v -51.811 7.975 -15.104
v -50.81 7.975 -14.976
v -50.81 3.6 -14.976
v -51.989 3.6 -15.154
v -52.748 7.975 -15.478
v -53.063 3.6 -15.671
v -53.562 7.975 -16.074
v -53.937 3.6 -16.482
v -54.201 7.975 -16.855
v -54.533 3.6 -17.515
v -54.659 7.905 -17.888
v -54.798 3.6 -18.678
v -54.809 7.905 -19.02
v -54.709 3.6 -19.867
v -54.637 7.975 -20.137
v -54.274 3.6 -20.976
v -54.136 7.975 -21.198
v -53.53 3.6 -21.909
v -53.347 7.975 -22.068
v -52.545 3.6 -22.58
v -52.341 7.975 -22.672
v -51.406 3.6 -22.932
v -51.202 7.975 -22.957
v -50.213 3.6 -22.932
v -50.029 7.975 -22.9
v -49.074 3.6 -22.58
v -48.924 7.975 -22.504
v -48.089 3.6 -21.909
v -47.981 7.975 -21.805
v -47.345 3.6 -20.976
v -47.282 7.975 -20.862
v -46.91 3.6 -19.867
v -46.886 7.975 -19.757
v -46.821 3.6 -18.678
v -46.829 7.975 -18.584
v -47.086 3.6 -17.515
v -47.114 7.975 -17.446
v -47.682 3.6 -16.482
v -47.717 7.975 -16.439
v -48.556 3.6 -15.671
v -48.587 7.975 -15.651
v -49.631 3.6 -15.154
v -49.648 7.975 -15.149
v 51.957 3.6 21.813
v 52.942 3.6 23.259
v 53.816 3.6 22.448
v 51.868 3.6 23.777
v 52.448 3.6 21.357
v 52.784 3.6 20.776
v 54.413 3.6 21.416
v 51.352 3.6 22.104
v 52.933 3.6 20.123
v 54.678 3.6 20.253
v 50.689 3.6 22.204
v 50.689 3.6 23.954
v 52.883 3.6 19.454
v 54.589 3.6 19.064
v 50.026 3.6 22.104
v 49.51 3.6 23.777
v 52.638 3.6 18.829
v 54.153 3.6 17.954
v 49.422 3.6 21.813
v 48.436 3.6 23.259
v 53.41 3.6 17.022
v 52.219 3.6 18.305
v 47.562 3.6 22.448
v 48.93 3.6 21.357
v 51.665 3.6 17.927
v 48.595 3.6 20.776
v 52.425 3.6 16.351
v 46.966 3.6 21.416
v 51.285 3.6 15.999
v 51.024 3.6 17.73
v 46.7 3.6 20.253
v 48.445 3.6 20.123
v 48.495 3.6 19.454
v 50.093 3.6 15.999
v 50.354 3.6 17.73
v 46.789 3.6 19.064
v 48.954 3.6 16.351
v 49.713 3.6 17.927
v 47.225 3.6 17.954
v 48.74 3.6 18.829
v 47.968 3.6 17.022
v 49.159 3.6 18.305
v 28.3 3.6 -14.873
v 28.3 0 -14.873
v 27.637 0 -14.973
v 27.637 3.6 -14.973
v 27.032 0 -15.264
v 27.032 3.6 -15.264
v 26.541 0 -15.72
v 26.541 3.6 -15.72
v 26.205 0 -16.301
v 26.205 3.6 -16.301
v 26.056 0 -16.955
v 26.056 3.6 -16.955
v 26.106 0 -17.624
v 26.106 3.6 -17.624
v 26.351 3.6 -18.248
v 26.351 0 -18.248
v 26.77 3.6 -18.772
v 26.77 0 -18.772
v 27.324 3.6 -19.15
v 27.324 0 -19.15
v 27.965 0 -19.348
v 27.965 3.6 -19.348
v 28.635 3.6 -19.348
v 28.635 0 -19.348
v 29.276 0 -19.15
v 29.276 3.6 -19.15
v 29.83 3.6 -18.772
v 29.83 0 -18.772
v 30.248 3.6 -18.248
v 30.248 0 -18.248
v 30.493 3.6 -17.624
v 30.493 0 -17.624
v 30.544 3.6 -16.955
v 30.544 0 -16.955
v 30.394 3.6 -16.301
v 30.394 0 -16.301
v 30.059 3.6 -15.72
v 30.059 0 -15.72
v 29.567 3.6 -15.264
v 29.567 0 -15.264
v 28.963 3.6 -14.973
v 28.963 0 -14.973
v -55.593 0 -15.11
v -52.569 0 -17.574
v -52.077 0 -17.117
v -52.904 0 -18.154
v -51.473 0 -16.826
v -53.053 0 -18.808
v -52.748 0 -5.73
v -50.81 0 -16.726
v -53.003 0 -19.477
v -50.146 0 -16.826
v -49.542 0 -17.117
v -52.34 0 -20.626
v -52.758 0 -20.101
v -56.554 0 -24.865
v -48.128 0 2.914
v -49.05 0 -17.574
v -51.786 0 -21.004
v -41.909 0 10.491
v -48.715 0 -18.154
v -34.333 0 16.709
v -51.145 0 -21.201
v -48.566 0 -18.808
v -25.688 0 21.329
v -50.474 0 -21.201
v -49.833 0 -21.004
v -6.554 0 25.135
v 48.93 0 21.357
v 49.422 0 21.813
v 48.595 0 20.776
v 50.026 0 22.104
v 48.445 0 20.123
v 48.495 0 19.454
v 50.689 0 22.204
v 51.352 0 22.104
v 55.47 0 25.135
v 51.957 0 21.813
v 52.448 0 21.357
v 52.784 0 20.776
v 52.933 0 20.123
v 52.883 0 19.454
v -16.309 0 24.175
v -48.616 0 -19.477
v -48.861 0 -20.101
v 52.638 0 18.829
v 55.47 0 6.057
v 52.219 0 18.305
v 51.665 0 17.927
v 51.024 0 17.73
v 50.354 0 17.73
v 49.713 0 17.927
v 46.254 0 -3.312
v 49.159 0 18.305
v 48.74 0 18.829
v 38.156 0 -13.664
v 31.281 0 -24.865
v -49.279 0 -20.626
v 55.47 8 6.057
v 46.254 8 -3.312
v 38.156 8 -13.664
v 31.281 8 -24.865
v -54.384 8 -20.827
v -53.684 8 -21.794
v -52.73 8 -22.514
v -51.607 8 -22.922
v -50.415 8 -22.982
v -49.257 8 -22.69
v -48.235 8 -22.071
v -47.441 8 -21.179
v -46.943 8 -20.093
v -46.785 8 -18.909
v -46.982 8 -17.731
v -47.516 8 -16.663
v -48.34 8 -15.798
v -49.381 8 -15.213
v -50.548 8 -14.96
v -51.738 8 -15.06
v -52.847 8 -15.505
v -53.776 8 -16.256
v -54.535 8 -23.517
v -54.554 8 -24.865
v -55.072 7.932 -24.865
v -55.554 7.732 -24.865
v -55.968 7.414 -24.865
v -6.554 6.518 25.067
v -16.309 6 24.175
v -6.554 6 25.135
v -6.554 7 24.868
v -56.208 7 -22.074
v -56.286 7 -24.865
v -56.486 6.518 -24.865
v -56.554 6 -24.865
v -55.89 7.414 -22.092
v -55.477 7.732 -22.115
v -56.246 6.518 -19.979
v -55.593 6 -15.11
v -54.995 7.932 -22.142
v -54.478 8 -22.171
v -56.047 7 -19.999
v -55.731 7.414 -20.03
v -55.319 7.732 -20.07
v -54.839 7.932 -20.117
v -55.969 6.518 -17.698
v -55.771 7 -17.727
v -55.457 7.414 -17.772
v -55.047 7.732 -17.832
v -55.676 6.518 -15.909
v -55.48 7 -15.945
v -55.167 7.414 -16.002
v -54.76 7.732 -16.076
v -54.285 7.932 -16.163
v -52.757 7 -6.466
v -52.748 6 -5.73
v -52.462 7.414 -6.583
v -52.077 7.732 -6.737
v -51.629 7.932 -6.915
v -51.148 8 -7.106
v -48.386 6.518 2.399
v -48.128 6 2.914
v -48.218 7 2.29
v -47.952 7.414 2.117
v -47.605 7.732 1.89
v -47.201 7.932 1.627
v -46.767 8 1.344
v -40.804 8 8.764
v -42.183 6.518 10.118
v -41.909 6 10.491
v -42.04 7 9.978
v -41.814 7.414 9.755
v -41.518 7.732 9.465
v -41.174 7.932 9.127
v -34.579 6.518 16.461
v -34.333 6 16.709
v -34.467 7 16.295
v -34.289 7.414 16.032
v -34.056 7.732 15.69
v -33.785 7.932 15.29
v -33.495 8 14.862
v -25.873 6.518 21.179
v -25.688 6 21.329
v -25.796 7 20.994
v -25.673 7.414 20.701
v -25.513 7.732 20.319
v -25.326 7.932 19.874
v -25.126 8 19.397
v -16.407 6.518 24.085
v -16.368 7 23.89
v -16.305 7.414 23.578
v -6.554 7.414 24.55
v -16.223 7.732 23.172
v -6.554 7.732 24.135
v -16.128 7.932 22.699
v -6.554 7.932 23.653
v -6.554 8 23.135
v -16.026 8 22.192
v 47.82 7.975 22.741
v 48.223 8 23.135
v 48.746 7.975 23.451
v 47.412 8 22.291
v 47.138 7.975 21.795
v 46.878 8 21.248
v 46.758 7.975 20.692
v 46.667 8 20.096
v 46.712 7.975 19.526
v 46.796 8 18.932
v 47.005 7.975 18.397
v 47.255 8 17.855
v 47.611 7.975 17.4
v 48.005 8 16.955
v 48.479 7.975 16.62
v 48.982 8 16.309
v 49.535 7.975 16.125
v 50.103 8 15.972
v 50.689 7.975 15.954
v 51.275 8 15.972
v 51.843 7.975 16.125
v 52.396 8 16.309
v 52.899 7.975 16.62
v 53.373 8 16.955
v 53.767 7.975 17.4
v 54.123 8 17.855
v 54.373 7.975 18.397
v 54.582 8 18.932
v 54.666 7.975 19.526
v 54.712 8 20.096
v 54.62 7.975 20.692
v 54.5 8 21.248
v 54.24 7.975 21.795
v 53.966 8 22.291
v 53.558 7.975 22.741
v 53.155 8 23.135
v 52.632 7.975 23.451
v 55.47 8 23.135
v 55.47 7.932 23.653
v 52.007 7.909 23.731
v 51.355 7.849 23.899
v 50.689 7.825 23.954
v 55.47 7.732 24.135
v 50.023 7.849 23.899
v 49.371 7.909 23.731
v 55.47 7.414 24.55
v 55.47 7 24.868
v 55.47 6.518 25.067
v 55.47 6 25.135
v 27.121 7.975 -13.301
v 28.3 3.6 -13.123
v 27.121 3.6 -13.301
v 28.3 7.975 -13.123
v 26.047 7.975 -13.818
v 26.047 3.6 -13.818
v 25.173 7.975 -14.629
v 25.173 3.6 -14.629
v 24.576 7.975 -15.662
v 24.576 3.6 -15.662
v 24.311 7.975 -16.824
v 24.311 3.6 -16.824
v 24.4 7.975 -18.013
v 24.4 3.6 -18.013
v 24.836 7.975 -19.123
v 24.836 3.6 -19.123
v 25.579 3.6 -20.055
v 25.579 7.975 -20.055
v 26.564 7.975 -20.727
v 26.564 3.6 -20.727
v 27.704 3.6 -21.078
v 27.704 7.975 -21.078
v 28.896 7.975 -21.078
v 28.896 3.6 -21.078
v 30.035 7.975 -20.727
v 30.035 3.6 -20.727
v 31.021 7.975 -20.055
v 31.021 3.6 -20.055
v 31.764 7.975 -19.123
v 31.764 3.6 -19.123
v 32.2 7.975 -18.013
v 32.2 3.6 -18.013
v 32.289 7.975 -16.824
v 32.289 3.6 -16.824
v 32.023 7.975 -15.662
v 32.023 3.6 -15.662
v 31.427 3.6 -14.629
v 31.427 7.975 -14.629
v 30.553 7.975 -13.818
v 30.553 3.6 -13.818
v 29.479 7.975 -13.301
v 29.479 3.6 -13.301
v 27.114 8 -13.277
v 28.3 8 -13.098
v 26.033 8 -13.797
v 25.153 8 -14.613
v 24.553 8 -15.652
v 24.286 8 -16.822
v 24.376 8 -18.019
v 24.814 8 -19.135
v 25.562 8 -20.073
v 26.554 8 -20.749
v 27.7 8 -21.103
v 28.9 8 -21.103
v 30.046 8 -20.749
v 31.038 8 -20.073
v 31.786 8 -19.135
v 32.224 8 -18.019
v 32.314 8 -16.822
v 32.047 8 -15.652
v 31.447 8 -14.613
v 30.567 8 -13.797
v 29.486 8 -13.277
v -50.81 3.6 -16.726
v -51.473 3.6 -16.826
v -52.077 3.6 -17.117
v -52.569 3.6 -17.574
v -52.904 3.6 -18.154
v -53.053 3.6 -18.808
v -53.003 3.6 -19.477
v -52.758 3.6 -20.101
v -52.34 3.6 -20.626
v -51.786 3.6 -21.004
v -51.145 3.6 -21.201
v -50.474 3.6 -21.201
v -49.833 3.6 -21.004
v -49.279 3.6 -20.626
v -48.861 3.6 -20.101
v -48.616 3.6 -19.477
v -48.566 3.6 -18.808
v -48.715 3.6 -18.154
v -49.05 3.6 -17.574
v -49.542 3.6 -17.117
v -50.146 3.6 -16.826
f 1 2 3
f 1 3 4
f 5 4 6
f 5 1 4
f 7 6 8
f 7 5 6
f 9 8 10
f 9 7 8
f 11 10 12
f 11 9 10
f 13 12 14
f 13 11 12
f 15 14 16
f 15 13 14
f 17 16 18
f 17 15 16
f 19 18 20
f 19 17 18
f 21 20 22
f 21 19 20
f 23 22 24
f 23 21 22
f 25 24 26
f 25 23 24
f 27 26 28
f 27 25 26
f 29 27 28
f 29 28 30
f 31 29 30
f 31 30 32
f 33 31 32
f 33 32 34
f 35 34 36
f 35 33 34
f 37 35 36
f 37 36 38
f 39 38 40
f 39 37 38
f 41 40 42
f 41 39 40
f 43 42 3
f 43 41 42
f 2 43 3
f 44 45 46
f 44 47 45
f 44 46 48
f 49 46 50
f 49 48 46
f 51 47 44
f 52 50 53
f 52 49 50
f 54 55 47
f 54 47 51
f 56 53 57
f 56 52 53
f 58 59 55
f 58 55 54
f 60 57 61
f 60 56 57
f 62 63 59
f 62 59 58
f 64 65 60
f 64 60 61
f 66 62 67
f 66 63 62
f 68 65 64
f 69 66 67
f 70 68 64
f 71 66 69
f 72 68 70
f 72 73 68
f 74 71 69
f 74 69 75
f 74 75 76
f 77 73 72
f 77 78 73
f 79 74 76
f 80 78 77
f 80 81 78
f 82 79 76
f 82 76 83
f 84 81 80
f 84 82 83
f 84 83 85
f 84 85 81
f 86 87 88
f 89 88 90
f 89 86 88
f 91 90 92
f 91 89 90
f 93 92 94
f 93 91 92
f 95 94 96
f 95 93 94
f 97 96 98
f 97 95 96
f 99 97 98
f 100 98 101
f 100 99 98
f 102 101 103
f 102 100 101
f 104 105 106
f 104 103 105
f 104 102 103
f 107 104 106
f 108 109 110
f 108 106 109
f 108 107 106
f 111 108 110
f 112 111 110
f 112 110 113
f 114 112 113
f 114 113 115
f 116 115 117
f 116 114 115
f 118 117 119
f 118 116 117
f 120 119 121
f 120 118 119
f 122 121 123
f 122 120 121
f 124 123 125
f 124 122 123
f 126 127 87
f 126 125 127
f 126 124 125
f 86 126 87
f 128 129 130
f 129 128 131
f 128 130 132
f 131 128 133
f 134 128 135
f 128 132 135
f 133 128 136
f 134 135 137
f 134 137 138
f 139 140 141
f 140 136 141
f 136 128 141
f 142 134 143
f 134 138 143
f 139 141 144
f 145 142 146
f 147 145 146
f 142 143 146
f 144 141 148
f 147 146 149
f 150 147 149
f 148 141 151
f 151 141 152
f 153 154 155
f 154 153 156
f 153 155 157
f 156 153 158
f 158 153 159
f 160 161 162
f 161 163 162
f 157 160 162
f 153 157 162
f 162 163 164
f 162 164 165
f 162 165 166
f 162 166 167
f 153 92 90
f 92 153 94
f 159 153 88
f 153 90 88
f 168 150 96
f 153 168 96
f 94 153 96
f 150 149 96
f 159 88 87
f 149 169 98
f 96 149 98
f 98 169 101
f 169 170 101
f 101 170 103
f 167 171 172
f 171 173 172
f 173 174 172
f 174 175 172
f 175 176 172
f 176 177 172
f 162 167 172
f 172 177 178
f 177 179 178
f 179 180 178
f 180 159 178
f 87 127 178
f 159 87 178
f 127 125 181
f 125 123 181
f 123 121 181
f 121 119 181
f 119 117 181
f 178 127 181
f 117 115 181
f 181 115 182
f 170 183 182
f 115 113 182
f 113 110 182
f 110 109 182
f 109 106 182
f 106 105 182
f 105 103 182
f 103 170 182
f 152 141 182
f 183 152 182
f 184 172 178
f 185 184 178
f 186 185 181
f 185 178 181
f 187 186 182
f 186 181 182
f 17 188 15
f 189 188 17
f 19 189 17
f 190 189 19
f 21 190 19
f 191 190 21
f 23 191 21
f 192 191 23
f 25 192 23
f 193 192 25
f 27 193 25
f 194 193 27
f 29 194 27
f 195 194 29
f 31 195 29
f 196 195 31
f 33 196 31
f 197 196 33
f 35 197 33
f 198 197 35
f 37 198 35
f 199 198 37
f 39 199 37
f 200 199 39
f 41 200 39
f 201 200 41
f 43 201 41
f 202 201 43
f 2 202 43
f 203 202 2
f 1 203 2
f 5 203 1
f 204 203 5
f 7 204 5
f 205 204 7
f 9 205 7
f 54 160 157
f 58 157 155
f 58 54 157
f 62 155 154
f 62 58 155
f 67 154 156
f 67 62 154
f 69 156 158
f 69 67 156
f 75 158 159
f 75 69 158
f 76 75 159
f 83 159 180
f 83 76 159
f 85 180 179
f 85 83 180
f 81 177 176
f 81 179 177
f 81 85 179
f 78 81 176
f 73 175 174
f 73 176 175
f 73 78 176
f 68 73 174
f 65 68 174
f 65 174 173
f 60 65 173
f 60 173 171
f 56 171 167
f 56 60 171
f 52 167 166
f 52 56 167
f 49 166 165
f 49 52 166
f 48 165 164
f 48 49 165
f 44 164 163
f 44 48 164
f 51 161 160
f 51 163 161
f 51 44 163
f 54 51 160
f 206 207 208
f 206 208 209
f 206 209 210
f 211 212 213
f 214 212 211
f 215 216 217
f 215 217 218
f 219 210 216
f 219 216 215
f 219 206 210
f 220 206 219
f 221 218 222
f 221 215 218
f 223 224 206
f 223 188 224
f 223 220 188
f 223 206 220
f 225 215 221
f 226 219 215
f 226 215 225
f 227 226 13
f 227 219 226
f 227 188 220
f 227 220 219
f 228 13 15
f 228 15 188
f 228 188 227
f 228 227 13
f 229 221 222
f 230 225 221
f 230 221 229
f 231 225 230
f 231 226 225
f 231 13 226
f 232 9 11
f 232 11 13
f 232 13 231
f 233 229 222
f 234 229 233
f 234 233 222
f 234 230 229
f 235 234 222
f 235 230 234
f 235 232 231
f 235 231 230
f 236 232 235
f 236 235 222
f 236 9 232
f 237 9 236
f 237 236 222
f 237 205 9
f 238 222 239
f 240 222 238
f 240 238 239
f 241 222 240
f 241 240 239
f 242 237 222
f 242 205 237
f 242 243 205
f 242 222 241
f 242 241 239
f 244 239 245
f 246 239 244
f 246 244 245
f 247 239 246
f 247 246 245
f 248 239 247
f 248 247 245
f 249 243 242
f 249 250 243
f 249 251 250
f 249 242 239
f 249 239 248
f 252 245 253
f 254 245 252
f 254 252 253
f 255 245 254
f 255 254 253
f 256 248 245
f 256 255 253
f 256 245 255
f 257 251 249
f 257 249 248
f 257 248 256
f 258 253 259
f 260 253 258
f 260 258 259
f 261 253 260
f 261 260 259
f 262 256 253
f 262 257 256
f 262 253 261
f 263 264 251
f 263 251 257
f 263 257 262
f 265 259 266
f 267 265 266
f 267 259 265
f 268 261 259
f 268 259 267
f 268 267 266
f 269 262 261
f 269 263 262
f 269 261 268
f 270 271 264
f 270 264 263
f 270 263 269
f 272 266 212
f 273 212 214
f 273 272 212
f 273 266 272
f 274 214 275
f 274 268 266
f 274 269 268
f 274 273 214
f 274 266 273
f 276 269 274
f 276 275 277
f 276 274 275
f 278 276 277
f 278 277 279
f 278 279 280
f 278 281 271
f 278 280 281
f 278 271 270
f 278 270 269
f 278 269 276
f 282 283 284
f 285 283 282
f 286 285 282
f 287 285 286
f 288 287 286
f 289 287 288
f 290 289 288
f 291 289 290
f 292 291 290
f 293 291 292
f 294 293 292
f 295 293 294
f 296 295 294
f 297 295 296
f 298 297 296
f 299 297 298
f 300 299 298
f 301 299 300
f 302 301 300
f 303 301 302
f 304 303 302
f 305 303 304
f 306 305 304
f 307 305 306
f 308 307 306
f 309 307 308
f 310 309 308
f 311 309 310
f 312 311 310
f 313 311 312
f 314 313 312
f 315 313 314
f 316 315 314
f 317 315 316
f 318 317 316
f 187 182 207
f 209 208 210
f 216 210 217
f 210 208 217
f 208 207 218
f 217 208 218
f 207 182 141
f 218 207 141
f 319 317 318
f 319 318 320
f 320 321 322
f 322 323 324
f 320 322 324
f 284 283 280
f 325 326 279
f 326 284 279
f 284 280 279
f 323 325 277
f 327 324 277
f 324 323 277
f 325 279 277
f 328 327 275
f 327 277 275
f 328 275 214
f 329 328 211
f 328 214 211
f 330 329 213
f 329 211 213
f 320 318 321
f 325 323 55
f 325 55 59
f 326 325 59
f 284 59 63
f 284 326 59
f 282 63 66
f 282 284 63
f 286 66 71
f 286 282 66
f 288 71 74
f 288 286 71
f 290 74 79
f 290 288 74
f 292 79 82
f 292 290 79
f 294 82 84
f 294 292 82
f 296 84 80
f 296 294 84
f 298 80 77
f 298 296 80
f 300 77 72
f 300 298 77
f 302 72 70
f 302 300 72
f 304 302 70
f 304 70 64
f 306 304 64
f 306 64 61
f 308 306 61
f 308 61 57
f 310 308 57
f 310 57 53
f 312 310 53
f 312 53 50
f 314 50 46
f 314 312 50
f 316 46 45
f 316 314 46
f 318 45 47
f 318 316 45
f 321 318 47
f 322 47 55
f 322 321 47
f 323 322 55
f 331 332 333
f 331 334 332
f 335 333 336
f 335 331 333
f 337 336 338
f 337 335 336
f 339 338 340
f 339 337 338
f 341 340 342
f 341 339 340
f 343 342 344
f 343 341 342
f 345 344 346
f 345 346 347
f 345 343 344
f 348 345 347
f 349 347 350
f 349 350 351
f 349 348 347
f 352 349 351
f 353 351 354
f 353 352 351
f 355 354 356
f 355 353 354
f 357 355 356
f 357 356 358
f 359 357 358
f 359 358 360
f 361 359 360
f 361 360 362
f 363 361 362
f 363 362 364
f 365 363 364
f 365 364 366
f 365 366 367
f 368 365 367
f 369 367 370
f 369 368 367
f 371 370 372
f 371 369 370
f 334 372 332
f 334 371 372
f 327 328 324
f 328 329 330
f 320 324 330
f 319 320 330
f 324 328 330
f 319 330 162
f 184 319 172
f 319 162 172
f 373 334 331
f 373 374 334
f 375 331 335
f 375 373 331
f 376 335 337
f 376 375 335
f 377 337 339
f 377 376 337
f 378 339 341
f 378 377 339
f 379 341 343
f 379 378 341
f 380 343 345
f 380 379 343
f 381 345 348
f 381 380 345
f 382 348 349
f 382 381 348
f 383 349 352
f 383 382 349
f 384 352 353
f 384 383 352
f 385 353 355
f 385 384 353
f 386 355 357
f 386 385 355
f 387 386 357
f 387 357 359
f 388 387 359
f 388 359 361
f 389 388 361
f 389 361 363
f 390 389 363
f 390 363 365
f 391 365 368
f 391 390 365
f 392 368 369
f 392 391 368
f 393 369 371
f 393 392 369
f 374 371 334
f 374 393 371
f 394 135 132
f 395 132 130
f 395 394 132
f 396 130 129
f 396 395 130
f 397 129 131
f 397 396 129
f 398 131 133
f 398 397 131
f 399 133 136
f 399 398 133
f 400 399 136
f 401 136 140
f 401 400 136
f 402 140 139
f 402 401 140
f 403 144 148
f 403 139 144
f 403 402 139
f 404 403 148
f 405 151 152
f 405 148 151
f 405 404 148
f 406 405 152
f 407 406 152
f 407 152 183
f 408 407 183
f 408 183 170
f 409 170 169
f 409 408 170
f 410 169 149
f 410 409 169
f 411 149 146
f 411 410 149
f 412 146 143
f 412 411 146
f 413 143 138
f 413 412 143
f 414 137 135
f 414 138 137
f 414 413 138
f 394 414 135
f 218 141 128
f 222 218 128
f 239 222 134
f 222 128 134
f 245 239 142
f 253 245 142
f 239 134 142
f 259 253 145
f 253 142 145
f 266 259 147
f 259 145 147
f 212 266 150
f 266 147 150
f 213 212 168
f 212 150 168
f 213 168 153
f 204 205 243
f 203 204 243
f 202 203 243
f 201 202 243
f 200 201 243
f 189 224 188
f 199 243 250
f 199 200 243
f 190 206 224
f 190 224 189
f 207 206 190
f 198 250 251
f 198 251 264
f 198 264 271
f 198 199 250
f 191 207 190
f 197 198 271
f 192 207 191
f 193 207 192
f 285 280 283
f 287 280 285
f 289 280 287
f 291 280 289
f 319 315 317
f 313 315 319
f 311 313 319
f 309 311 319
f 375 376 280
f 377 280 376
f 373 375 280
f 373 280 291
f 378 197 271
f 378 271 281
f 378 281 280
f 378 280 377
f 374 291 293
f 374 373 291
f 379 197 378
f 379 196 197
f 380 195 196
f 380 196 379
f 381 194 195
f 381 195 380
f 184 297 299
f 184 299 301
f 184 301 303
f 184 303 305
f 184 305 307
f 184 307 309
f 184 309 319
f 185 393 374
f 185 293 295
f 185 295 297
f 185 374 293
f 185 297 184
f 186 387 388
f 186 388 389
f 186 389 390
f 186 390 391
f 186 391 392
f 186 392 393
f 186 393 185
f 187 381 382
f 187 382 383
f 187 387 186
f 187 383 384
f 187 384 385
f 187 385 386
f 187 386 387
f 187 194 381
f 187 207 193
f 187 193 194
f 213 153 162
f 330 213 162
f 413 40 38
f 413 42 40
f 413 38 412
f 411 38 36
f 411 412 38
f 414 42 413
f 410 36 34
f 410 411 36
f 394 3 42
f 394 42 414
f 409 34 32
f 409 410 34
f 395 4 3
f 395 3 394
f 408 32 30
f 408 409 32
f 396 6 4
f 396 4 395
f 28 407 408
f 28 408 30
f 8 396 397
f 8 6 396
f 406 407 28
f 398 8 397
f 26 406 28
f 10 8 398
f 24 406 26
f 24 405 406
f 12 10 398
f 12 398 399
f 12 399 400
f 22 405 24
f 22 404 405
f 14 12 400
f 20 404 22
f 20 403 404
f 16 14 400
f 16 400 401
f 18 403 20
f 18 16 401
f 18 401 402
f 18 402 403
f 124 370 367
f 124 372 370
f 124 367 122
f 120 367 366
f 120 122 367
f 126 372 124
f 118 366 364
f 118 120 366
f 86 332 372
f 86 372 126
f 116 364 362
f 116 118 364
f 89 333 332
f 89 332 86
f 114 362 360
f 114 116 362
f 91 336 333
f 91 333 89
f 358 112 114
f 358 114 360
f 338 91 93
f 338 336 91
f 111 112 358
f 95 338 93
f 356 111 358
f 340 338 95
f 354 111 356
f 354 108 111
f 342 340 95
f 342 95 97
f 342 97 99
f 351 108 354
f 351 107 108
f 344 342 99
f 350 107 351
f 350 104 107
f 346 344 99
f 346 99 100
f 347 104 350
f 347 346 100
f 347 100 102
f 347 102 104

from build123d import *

# Parameters (mm, degrees)
BOSS_EXTRUDE2_DEPTH                          = 8
CBORE_FOR_M4_HEX_SOCKET_HEAD_CAP_SCR_2_COUNT = 2
CBORE_FOR_M4_HEX_SOCKET_HEAD_CAP_SCR_2_PITCH = 43.312825964
CBORE_FOR_M4_HEX_SOCKET_HEAD_CAP_SCR_3_COUNT = 2
CBORE_FOR_M4_HEX_SOCKET_HEAD_CAP_SCR_3_PITCH = 79.131181871
FILLET1_R                                    = 2


with BuildPart() as part:
    # Sketch6 → Boss-Extrude2 (new body)
    with BuildSketch(Plane(origin=(0, 0, 0), x_dir=(1, 0, 0), z_dir=(0, 1, 0))):
        with BuildLine():
            Line((-49.241489328, 24.864510752), (-56.554028145, 24.864510752))
            ThreePointArc((-56.554028145, 24.864510752), (-41.909367204, -10.490828308), (-6.554028145, -25.135489248))
            Line((-6.554028145, -25.135489248), (55.470114159, -25.135489248))
            Line((55.470114159, -25.135489248), (55.470114159, -6.057055904))
            ThreePointArc((55.470114159, -6.057055904), (42.058086193, 8.373222092), (31.280664632, 24.864510752))
            Line((31.280664632, 24.864510752), (15.257491481, 24.864510752))
            Line((15.257491481, 24.864510752), (-49.241489328, 24.864510752))
        make_face()
    extrude(amount=BOSS_EXTRUDE2_DEPTH)

    # Sketch9 → CBORE for M4 Hex Socket Head Cap Screw1 (revolve, cut)
    with BuildSketch(Plane(origin=(28.299910658, 8, -17.122913845), x_dir=(0, 0, 1), z_dir=(1, 0, 0))):
        Polygon((0, 0), (0, 11.451936393), (2.25, 10.1), (2.25, 4.4), (4, 4.4), (4, 0.025), (4.025, 0), align=None)
    cbore_for_m4_hex_socket_head_cap_screw1 = revolve(axis=Axis((28.299910658, 14.35, -17.122913845), (0, -1, 0)), mode=Mode.SUBTRACT)

    # CBORE for M4 Hex Socket Head Cap Scr 2: CBORE for M4 Hex Socket Head Cap Screw1 ×2
    with Locations(*[Vector(0.5169167622472475, 0, 0.8560356656751065) * (i * CBORE_FOR_M4_HEX_SOCKET_HEAD_CAP_SCR_2_PITCH) for i in range(1, CBORE_FOR_M4_HEX_SOCKET_HEAD_CAP_SCR_2_COUNT)]):
        add(cbore_for_m4_hex_socket_head_cap_screw1, mode=Mode.SUBTRACT)

    # CBORE for M4 Hex Socket Head Cap Scr 3: CBORE for M4 Hex Socket Head Cap Screw1 ×2
    with Locations(*[Vector(-0.9997256378089421, 0, -0.023423259967479314) * (i * CBORE_FOR_M4_HEX_SOCKET_HEAD_CAP_SCR_3_PITCH) for i in range(1, CBORE_FOR_M4_HEX_SOCKET_HEAD_CAP_SCR_3_COUNT)]):
        add(cbore_for_m4_hex_socket_head_cap_screw1, mode=Mode.SUBTRACT)

    # Fillet1
    # the kernel refuses this fillet: 2 mm, written as the material it takes off along each edge
    with BuildSketch(Plane(origin=(-6.554028145, 8, -24.864510752), x_dir=(-0.99500015408545, 0, -0.09987338669500904), z_dir=(0.09987338669500904, 0, -0.99500015408545))) as fillet1_piece_1:
        with BuildLine():
            CenterArc((50 - FILLET1_R, -FILLET1_R), FILLET1_R, 0, 90)
            Line((50, -FILLET1_R), (50, 0))
            Line((50, 0), (50 - FILLET1_R, 0))
        make_face()
    revolve(axis=Axis((-6.554028145, 8, -24.864510752), (0, 1, 0)), revolution_arc=95.731879569, mode=Mode.SUBTRACT)
    with BuildSketch(Plane(origin=(-6.554028145, 8, 25.135489248), x_dir=(0, 0, -1), z_dir=(1, 0, 0))) as fillet1_piece_2:
        with BuildLine():
            CenterArc((FILLET1_R, -FILLET1_R), FILLET1_R, 90, 90)
            Line((0, -FILLET1_R), (0, 0))
            Line((0, 0), (FILLET1_R, 0))
        make_face()
    extrude(amount=67.024142304, mode=Mode.SUBTRACT)


solid = part.part
